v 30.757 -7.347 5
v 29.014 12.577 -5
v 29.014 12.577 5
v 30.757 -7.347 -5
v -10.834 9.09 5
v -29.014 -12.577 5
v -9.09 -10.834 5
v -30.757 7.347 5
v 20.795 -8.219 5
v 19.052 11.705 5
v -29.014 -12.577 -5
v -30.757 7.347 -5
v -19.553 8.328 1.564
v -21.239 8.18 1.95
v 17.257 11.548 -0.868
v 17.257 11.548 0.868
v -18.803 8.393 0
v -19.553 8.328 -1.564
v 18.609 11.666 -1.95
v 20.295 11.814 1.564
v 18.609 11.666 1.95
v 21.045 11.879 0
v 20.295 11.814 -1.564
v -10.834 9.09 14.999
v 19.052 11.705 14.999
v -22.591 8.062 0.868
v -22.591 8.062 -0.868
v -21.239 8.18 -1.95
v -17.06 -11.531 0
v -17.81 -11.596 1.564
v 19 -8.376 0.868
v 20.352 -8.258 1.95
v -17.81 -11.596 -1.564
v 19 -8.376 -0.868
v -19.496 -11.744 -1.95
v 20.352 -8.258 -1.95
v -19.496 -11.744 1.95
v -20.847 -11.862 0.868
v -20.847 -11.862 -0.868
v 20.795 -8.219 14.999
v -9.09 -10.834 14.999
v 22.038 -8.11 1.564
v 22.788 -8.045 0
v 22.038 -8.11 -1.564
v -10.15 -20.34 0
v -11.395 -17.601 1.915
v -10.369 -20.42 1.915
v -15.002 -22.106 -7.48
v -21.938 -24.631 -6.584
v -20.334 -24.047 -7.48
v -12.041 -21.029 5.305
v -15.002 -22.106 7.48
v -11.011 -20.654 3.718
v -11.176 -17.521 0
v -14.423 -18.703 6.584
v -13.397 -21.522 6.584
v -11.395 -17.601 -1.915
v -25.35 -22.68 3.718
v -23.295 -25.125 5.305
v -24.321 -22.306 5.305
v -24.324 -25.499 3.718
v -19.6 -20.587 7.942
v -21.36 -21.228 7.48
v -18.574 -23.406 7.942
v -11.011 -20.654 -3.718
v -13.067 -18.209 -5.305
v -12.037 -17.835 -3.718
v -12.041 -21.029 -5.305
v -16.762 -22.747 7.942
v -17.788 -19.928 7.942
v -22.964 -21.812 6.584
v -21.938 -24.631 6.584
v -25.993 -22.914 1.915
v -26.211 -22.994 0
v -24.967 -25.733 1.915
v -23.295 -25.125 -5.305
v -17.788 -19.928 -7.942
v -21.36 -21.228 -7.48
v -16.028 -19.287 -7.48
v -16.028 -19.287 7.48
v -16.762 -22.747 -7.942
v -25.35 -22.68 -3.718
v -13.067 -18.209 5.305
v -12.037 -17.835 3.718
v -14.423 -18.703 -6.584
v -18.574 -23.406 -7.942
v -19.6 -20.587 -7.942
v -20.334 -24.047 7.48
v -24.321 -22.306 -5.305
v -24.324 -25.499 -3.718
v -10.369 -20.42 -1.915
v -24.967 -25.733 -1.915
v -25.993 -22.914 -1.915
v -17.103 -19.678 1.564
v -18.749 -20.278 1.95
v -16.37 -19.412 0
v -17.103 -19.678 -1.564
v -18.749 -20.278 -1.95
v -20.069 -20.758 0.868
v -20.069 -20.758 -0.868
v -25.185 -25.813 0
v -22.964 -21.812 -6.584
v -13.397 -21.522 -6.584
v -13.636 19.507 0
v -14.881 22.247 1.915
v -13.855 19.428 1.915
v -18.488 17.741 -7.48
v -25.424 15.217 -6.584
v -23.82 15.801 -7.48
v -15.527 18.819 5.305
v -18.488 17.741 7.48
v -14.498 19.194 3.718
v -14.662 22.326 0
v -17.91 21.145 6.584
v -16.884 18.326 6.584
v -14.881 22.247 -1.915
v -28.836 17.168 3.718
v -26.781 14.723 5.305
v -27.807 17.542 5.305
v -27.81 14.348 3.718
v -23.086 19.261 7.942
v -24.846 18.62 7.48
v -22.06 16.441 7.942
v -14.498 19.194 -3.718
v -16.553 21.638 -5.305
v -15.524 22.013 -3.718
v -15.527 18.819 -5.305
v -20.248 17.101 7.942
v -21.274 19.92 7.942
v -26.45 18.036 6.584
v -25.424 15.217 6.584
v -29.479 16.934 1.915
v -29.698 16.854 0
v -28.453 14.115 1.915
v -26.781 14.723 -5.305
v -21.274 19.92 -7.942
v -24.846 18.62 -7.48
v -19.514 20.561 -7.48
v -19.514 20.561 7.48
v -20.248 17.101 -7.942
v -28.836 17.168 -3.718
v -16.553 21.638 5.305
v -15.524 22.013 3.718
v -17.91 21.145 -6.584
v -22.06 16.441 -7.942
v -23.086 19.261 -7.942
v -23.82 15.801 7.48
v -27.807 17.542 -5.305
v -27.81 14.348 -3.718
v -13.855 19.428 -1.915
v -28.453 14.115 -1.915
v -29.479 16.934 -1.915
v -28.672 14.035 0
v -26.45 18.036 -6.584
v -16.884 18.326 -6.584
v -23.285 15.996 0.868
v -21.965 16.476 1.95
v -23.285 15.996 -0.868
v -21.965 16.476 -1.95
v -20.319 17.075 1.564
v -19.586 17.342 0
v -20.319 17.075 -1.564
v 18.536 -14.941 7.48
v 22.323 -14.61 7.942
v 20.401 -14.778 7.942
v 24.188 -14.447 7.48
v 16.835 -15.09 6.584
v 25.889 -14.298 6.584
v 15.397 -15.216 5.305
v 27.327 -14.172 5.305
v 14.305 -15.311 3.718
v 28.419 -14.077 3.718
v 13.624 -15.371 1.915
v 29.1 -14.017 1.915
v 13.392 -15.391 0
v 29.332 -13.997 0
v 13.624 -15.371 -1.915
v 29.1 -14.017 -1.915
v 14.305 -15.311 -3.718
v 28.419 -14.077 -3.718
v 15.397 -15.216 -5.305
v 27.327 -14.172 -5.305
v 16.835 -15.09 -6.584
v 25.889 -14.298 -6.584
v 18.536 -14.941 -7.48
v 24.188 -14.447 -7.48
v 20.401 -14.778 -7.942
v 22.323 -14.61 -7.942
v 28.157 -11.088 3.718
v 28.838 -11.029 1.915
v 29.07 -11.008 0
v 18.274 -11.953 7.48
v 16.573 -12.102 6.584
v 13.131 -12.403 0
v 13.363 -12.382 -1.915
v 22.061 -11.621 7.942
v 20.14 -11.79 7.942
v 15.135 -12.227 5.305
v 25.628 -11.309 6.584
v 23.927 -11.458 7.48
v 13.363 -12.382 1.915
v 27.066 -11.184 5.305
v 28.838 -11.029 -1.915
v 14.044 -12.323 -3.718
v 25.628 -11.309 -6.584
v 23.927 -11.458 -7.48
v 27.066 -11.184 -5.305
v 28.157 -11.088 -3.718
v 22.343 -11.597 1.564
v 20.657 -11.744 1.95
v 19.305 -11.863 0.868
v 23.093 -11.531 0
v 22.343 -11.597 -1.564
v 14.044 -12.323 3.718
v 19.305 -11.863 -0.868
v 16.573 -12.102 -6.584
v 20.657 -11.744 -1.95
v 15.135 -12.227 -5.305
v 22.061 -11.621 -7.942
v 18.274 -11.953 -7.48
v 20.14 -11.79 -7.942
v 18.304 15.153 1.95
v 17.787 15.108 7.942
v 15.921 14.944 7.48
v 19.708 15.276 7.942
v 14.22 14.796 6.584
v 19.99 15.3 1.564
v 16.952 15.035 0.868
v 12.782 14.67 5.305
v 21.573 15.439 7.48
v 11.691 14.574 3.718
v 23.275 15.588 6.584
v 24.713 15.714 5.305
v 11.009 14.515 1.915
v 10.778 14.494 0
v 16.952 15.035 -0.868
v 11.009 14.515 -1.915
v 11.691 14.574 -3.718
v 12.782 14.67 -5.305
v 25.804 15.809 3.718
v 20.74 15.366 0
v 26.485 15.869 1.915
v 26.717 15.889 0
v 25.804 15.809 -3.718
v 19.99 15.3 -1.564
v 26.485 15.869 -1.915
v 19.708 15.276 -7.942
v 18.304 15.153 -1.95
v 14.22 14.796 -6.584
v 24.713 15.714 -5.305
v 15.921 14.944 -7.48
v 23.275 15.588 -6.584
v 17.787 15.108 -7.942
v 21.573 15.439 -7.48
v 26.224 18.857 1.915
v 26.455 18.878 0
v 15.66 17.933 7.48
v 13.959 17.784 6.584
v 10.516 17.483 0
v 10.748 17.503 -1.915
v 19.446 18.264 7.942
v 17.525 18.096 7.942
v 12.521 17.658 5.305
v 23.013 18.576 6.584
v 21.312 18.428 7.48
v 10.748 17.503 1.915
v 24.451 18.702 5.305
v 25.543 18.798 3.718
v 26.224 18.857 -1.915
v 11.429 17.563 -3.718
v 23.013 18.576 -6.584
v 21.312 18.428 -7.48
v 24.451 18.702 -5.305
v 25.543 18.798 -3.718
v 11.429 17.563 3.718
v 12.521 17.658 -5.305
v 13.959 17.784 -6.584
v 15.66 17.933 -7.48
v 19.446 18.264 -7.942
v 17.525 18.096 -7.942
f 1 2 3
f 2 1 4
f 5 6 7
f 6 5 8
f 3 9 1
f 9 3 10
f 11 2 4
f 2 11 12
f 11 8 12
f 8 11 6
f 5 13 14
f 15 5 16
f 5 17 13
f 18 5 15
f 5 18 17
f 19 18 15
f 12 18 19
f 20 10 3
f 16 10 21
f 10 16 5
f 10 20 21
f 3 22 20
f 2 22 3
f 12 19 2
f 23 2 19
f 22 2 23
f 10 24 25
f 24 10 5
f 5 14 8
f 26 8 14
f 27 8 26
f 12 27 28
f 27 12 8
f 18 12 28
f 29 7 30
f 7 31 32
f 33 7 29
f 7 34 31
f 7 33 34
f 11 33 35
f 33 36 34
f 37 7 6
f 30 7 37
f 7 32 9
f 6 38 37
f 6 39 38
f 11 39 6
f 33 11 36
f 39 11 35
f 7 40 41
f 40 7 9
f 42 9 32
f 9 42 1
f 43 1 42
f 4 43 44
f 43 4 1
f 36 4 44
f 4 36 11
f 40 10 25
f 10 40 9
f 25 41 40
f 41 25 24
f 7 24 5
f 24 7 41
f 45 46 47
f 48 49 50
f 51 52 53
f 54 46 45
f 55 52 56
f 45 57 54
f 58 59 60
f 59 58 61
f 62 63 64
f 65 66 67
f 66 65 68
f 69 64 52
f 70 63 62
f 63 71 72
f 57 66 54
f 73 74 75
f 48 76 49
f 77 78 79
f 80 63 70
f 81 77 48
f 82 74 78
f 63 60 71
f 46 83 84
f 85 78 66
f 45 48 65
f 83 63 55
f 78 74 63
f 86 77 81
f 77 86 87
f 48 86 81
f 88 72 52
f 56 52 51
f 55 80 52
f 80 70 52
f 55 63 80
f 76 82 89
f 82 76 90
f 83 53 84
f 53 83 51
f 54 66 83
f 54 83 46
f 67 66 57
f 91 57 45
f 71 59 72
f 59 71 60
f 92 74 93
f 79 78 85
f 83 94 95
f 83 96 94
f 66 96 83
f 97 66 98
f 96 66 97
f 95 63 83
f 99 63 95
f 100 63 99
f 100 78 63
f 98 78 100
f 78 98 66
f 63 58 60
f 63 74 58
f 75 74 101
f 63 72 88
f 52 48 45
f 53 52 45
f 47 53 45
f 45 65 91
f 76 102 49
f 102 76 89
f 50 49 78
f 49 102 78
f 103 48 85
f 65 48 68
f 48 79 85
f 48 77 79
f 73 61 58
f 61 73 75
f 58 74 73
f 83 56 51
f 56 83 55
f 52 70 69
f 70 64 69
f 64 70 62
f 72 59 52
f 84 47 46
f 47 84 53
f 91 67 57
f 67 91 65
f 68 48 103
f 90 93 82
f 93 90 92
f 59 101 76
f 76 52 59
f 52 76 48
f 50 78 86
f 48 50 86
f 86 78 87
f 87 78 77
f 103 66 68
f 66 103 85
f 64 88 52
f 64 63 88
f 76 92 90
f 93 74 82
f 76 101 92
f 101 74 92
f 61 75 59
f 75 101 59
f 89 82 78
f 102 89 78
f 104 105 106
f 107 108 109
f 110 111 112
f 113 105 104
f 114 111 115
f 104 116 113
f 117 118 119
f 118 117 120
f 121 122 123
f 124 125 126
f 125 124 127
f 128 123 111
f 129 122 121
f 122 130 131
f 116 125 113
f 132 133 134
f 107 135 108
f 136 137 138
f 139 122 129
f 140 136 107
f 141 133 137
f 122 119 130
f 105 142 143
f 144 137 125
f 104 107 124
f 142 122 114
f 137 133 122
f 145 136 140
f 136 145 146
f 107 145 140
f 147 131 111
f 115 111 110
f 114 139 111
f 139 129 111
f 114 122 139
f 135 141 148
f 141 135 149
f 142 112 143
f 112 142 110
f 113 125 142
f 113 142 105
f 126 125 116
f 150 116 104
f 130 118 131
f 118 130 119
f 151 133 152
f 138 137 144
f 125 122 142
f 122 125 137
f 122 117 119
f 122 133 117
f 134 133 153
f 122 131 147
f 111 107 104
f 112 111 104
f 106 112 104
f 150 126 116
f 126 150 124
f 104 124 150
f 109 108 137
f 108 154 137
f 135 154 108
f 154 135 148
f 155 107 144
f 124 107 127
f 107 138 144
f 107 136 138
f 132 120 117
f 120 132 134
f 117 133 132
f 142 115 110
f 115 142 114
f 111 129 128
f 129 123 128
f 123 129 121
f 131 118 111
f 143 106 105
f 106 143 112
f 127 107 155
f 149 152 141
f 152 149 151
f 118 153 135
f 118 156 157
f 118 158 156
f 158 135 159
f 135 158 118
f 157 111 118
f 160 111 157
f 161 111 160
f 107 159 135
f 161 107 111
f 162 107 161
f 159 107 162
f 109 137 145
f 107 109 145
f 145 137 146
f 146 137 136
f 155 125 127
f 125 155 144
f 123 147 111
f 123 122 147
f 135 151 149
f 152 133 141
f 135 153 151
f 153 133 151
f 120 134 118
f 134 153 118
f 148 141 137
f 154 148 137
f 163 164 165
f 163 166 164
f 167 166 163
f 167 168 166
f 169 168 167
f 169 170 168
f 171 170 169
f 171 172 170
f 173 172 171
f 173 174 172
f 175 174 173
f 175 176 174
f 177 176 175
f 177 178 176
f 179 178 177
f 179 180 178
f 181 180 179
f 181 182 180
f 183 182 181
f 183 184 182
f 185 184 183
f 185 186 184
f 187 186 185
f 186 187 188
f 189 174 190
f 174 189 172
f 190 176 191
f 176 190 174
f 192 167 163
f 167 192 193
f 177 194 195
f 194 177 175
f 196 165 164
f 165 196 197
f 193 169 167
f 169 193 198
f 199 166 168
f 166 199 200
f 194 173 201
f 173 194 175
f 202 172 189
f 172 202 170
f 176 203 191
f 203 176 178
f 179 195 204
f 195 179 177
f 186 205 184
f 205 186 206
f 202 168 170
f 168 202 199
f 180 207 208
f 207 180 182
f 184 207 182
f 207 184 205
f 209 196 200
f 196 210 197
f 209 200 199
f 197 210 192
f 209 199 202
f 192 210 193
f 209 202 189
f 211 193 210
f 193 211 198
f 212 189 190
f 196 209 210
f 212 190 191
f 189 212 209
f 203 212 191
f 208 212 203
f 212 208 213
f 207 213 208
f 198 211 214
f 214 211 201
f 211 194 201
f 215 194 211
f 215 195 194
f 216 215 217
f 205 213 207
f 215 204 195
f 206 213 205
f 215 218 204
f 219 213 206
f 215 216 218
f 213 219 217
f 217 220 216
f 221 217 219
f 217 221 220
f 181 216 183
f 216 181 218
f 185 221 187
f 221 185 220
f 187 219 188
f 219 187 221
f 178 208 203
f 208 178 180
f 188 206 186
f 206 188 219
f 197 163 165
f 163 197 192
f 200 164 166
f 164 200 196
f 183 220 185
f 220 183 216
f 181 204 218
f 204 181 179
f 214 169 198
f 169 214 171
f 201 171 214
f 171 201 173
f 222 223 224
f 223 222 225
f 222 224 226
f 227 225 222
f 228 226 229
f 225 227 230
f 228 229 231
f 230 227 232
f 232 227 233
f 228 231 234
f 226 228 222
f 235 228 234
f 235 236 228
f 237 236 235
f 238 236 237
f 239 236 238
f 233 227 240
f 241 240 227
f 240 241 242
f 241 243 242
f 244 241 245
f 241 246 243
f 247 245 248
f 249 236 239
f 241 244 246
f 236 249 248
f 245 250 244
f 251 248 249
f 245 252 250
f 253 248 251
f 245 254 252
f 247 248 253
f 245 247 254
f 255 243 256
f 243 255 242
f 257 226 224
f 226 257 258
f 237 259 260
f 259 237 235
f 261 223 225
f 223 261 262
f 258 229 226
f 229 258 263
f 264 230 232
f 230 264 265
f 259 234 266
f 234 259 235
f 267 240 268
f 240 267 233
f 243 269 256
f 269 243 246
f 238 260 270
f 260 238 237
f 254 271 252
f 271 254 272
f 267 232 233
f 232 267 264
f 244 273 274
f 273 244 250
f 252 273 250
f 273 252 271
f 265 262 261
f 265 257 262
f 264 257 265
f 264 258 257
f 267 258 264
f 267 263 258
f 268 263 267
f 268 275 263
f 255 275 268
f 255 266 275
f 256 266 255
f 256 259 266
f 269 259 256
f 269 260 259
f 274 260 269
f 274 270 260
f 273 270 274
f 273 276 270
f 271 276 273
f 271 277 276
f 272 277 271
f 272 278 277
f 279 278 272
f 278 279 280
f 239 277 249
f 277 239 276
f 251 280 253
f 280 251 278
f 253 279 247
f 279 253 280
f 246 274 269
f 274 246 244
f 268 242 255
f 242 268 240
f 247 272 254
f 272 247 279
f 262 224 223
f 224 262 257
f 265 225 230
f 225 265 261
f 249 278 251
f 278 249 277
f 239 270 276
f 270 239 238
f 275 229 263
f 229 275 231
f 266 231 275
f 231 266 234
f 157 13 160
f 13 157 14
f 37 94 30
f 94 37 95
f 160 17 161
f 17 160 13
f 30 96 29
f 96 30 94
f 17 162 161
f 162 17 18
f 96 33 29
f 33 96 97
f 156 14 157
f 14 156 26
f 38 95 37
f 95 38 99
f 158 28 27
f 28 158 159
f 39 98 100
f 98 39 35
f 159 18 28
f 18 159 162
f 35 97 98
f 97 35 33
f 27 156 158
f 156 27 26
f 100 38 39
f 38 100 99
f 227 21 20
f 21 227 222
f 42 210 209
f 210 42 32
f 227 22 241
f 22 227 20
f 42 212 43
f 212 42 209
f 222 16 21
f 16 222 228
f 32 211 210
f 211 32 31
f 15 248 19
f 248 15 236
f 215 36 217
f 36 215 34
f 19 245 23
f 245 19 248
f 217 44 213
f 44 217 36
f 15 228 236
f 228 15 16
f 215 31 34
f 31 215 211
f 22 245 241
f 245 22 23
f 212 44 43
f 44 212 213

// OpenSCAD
//$fa = 1;
//$fs = 0.4;
// Car body base
base_height = 10;
top_height = 10;
trak = 20;
rotate([0, 0, 5])
{
cube([60,20,base_height],center=true);
// Car body top
translate([5,0,(base_height + top_height)/2 - 0.001])
    cube([30,20,top_height],center=true);
// Front left wheel
translate([-20,-trak,0])
    rotate([90,0,15])
    cylinder(h=3,r=8,center=true);
// Front right wheel
translate([-20,trak,0])
    rotate([90,0,15])
    cylinder(h=3,r=8,center=true);
// Rear left wheel
translate([20,-15,0])
    rotate([90,0,0])
    cylinder(h=3,r=8,center=true);
// Rear right wheel
translate([20,15,0])
    rotate([90,0,0])
    cylinder(h=3,r=8,center=true);
// Front axle
translate([-20,0,0])
    rotate([90,0,0])
    cylinder(h=2*trak,r=2,center=true);
// Rear axle
translate([20,0,0])
    rotate([90,0,0])
    cylinder(h=30,r=2,center=true);
}
